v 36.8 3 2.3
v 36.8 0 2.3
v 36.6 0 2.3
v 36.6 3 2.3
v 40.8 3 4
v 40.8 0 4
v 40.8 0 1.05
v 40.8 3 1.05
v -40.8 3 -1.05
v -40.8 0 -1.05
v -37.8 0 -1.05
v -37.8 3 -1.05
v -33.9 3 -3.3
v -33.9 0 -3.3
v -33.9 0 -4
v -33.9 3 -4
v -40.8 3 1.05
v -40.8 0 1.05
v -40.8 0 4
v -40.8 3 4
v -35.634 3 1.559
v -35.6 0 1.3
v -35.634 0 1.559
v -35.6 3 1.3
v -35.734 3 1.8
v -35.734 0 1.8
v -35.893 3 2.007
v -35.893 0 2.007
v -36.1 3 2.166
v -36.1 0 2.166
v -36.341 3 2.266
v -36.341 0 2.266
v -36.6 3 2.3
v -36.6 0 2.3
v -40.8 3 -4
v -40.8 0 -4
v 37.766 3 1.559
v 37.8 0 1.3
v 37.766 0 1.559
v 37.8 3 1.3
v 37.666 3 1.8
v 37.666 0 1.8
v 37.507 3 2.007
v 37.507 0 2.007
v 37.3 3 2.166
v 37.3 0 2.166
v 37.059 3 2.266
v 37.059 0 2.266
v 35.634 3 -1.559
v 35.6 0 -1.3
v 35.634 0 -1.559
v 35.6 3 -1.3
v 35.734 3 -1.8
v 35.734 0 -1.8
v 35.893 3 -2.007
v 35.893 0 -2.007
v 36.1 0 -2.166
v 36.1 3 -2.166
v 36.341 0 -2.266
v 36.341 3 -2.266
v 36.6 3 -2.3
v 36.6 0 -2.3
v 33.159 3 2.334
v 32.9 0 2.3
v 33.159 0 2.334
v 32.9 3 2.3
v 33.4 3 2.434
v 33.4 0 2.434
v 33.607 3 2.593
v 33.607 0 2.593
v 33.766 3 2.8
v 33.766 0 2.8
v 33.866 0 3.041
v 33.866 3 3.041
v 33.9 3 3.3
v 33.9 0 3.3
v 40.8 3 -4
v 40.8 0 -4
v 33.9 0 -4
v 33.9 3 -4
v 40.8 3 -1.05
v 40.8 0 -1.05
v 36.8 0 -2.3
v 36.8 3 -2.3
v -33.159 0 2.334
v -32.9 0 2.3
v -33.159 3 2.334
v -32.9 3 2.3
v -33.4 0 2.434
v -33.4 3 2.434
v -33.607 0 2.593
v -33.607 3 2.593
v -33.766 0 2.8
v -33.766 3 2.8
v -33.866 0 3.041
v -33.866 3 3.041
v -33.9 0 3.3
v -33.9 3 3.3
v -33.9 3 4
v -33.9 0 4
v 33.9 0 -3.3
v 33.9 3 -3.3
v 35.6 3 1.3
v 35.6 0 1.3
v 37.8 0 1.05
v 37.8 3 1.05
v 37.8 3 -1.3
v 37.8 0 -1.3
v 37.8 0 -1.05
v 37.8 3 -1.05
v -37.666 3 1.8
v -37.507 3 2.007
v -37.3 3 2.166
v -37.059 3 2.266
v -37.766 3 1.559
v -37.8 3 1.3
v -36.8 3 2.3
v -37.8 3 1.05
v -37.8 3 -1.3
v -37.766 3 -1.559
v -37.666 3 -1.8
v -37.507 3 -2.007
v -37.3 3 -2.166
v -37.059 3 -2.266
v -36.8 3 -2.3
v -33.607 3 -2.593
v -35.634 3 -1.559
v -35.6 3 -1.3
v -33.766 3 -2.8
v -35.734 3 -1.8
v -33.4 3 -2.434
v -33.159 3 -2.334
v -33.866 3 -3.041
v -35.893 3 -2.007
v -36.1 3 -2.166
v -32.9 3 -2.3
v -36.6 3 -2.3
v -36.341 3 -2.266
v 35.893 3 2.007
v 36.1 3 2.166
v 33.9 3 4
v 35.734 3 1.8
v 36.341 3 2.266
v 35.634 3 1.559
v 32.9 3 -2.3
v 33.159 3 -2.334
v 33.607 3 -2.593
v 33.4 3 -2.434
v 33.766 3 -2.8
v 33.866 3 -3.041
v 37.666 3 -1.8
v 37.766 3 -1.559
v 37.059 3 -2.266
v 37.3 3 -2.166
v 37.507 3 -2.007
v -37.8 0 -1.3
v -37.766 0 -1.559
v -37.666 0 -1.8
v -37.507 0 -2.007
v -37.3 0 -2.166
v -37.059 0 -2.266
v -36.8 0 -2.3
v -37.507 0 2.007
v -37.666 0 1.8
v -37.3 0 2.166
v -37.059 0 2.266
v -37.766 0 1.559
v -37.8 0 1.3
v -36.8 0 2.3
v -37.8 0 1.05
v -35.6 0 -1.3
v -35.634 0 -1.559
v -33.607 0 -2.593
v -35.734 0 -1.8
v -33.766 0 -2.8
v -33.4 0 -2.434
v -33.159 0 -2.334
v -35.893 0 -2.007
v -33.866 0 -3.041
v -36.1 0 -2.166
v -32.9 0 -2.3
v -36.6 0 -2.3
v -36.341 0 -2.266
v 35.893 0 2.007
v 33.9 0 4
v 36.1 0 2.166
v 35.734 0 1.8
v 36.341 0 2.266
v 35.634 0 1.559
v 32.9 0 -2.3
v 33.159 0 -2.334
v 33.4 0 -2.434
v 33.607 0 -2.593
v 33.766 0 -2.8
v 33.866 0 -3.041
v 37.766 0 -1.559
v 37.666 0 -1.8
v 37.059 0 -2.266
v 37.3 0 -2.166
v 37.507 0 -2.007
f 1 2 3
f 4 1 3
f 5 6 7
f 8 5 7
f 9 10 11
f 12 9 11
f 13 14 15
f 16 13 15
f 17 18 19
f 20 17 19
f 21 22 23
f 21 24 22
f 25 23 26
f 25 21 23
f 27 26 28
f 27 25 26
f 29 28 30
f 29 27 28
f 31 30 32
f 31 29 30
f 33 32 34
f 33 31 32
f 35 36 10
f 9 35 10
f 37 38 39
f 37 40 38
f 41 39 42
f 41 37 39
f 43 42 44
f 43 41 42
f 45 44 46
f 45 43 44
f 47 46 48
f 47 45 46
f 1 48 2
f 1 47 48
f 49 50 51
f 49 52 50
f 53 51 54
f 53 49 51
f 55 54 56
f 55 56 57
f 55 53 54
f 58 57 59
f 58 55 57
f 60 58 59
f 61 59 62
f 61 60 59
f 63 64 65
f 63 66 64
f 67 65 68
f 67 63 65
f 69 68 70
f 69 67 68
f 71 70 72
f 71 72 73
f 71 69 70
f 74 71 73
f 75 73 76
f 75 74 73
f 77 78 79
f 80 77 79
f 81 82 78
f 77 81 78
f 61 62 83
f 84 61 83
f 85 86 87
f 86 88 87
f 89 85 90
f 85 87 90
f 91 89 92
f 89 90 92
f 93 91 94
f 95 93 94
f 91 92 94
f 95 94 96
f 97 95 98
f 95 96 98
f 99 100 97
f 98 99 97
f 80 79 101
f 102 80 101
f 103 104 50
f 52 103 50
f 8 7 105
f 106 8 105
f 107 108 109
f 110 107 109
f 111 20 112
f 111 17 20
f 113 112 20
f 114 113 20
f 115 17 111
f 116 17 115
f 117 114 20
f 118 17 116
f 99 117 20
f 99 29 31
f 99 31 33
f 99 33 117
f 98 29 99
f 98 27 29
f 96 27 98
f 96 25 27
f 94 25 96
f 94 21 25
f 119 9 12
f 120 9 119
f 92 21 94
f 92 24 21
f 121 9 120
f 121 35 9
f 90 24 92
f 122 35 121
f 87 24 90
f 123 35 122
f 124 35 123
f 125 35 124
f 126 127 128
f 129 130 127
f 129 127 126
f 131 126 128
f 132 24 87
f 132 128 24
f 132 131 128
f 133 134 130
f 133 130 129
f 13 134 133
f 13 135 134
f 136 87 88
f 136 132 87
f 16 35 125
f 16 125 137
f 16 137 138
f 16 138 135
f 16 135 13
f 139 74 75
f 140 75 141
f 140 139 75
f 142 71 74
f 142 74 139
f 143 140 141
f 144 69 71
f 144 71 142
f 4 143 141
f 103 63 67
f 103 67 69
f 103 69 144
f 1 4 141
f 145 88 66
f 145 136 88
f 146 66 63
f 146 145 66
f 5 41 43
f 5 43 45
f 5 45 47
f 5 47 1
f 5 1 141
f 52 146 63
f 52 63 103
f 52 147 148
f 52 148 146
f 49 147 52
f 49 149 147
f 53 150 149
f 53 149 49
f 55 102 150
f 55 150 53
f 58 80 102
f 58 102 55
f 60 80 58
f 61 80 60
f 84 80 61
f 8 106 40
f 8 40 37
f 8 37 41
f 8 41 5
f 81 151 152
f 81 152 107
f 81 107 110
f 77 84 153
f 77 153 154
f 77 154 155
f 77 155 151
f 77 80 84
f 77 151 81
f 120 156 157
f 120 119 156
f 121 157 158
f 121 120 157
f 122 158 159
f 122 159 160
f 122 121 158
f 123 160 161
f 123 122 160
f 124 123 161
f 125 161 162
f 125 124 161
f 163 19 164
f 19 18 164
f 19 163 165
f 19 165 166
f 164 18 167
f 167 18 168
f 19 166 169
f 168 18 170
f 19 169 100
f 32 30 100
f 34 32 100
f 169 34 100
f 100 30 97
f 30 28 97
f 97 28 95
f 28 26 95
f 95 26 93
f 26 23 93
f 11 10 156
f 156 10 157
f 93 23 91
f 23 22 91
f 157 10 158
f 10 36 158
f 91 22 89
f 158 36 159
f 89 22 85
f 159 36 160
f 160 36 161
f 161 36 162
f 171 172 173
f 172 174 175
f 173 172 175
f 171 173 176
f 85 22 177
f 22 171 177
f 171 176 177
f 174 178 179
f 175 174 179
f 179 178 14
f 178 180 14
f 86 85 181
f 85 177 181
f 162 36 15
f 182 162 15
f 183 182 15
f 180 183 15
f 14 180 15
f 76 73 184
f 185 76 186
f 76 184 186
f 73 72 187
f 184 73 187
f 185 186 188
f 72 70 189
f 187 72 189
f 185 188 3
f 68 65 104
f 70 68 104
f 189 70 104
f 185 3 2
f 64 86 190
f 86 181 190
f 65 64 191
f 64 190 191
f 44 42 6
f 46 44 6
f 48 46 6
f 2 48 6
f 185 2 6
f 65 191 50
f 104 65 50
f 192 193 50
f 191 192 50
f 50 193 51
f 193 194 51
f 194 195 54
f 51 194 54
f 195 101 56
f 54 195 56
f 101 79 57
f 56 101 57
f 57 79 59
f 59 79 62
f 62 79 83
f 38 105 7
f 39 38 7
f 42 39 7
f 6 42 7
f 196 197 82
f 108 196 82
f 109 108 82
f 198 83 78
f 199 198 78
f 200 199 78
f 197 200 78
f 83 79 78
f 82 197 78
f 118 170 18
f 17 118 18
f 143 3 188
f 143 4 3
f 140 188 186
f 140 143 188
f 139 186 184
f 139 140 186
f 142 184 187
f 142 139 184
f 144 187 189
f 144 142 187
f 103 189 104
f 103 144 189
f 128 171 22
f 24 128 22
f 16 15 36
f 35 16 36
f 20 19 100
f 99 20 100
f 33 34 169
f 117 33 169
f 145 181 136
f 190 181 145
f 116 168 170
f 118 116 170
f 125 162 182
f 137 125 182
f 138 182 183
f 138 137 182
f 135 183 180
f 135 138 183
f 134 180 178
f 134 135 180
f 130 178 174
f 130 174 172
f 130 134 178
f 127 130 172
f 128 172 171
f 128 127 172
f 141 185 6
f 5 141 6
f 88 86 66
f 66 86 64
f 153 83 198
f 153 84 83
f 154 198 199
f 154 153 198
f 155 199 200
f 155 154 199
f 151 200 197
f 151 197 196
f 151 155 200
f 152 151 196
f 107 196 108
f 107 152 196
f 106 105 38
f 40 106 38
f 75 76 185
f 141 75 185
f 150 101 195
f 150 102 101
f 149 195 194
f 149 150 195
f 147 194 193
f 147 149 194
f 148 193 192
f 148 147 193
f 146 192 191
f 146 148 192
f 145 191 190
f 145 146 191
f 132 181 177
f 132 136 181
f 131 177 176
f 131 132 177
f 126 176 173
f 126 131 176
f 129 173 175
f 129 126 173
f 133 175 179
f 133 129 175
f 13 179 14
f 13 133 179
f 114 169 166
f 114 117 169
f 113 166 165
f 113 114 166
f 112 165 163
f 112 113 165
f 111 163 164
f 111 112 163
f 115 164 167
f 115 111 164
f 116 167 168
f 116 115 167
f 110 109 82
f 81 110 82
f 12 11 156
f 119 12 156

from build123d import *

# Parameters (mm, degrees)
BASE_SHAPE_DEPTH  = 3
MILLING_FILLETS_R = 1


with BuildPart() as part:
    # Sketch1 → Base shape (new body)
    with BuildSketch(Plane(origin=(0, 0, 0), x_dir=(1, 0, 0), z_dir=(0, 1, 0))):
        Polygon((-33.9, 4), (-40.8, 4), (-40.8, 1.05), (-37.8, 1.05), (-37.8, 2.3), (-35.6, 2.3), (-35.6, -2.3), (-37.8, -2.3), (-37.8, -1.05), (-40.8, -1.05), (-40.8, -4), (-33.9, -4), (-33.9, -2.3), (33.9, -2.3), (33.9, -4), (40.8, -4), (40.8, -1.05), (37.8, -1.05), (37.8, -2.3), (35.6, -2.3), (35.6, 2.3), (37.8, 2.3), (37.8, 1.05), (40.8, 1.05), (40.8, 4), (33.9, 4), (33.9, 2.3), (-33.9, 2.3), align=None)
    extrude(amount=BASE_SHAPE_DEPTH)

    # Milling fillets
    milling_fillets_edges = [part.edges().sort_by_distance(p)[0] for p in [
        (37.8, 1.5, 2.3),
        (-35.6, 1.5, 2.3),
        (-37.8, 1.5, 2.3),
        (35.6, 1.5, 2.3),
        (35.6, 1.5, -2.3),
        (-37.8, 1.5, -2.3),
        (-35.6, 1.5, -2.3),
        (37.8, 1.5, -2.3),
        (33.9, 1.5, 2.3),
        (33.9, 1.5, -2.3),
        (-33.9, 1.5, -2.3),
        (-33.9, 1.5, 2.3),
    ]]
    fillet(milling_fillets_edges, radius=MILLING_FILLETS_R)


solid = part.part
